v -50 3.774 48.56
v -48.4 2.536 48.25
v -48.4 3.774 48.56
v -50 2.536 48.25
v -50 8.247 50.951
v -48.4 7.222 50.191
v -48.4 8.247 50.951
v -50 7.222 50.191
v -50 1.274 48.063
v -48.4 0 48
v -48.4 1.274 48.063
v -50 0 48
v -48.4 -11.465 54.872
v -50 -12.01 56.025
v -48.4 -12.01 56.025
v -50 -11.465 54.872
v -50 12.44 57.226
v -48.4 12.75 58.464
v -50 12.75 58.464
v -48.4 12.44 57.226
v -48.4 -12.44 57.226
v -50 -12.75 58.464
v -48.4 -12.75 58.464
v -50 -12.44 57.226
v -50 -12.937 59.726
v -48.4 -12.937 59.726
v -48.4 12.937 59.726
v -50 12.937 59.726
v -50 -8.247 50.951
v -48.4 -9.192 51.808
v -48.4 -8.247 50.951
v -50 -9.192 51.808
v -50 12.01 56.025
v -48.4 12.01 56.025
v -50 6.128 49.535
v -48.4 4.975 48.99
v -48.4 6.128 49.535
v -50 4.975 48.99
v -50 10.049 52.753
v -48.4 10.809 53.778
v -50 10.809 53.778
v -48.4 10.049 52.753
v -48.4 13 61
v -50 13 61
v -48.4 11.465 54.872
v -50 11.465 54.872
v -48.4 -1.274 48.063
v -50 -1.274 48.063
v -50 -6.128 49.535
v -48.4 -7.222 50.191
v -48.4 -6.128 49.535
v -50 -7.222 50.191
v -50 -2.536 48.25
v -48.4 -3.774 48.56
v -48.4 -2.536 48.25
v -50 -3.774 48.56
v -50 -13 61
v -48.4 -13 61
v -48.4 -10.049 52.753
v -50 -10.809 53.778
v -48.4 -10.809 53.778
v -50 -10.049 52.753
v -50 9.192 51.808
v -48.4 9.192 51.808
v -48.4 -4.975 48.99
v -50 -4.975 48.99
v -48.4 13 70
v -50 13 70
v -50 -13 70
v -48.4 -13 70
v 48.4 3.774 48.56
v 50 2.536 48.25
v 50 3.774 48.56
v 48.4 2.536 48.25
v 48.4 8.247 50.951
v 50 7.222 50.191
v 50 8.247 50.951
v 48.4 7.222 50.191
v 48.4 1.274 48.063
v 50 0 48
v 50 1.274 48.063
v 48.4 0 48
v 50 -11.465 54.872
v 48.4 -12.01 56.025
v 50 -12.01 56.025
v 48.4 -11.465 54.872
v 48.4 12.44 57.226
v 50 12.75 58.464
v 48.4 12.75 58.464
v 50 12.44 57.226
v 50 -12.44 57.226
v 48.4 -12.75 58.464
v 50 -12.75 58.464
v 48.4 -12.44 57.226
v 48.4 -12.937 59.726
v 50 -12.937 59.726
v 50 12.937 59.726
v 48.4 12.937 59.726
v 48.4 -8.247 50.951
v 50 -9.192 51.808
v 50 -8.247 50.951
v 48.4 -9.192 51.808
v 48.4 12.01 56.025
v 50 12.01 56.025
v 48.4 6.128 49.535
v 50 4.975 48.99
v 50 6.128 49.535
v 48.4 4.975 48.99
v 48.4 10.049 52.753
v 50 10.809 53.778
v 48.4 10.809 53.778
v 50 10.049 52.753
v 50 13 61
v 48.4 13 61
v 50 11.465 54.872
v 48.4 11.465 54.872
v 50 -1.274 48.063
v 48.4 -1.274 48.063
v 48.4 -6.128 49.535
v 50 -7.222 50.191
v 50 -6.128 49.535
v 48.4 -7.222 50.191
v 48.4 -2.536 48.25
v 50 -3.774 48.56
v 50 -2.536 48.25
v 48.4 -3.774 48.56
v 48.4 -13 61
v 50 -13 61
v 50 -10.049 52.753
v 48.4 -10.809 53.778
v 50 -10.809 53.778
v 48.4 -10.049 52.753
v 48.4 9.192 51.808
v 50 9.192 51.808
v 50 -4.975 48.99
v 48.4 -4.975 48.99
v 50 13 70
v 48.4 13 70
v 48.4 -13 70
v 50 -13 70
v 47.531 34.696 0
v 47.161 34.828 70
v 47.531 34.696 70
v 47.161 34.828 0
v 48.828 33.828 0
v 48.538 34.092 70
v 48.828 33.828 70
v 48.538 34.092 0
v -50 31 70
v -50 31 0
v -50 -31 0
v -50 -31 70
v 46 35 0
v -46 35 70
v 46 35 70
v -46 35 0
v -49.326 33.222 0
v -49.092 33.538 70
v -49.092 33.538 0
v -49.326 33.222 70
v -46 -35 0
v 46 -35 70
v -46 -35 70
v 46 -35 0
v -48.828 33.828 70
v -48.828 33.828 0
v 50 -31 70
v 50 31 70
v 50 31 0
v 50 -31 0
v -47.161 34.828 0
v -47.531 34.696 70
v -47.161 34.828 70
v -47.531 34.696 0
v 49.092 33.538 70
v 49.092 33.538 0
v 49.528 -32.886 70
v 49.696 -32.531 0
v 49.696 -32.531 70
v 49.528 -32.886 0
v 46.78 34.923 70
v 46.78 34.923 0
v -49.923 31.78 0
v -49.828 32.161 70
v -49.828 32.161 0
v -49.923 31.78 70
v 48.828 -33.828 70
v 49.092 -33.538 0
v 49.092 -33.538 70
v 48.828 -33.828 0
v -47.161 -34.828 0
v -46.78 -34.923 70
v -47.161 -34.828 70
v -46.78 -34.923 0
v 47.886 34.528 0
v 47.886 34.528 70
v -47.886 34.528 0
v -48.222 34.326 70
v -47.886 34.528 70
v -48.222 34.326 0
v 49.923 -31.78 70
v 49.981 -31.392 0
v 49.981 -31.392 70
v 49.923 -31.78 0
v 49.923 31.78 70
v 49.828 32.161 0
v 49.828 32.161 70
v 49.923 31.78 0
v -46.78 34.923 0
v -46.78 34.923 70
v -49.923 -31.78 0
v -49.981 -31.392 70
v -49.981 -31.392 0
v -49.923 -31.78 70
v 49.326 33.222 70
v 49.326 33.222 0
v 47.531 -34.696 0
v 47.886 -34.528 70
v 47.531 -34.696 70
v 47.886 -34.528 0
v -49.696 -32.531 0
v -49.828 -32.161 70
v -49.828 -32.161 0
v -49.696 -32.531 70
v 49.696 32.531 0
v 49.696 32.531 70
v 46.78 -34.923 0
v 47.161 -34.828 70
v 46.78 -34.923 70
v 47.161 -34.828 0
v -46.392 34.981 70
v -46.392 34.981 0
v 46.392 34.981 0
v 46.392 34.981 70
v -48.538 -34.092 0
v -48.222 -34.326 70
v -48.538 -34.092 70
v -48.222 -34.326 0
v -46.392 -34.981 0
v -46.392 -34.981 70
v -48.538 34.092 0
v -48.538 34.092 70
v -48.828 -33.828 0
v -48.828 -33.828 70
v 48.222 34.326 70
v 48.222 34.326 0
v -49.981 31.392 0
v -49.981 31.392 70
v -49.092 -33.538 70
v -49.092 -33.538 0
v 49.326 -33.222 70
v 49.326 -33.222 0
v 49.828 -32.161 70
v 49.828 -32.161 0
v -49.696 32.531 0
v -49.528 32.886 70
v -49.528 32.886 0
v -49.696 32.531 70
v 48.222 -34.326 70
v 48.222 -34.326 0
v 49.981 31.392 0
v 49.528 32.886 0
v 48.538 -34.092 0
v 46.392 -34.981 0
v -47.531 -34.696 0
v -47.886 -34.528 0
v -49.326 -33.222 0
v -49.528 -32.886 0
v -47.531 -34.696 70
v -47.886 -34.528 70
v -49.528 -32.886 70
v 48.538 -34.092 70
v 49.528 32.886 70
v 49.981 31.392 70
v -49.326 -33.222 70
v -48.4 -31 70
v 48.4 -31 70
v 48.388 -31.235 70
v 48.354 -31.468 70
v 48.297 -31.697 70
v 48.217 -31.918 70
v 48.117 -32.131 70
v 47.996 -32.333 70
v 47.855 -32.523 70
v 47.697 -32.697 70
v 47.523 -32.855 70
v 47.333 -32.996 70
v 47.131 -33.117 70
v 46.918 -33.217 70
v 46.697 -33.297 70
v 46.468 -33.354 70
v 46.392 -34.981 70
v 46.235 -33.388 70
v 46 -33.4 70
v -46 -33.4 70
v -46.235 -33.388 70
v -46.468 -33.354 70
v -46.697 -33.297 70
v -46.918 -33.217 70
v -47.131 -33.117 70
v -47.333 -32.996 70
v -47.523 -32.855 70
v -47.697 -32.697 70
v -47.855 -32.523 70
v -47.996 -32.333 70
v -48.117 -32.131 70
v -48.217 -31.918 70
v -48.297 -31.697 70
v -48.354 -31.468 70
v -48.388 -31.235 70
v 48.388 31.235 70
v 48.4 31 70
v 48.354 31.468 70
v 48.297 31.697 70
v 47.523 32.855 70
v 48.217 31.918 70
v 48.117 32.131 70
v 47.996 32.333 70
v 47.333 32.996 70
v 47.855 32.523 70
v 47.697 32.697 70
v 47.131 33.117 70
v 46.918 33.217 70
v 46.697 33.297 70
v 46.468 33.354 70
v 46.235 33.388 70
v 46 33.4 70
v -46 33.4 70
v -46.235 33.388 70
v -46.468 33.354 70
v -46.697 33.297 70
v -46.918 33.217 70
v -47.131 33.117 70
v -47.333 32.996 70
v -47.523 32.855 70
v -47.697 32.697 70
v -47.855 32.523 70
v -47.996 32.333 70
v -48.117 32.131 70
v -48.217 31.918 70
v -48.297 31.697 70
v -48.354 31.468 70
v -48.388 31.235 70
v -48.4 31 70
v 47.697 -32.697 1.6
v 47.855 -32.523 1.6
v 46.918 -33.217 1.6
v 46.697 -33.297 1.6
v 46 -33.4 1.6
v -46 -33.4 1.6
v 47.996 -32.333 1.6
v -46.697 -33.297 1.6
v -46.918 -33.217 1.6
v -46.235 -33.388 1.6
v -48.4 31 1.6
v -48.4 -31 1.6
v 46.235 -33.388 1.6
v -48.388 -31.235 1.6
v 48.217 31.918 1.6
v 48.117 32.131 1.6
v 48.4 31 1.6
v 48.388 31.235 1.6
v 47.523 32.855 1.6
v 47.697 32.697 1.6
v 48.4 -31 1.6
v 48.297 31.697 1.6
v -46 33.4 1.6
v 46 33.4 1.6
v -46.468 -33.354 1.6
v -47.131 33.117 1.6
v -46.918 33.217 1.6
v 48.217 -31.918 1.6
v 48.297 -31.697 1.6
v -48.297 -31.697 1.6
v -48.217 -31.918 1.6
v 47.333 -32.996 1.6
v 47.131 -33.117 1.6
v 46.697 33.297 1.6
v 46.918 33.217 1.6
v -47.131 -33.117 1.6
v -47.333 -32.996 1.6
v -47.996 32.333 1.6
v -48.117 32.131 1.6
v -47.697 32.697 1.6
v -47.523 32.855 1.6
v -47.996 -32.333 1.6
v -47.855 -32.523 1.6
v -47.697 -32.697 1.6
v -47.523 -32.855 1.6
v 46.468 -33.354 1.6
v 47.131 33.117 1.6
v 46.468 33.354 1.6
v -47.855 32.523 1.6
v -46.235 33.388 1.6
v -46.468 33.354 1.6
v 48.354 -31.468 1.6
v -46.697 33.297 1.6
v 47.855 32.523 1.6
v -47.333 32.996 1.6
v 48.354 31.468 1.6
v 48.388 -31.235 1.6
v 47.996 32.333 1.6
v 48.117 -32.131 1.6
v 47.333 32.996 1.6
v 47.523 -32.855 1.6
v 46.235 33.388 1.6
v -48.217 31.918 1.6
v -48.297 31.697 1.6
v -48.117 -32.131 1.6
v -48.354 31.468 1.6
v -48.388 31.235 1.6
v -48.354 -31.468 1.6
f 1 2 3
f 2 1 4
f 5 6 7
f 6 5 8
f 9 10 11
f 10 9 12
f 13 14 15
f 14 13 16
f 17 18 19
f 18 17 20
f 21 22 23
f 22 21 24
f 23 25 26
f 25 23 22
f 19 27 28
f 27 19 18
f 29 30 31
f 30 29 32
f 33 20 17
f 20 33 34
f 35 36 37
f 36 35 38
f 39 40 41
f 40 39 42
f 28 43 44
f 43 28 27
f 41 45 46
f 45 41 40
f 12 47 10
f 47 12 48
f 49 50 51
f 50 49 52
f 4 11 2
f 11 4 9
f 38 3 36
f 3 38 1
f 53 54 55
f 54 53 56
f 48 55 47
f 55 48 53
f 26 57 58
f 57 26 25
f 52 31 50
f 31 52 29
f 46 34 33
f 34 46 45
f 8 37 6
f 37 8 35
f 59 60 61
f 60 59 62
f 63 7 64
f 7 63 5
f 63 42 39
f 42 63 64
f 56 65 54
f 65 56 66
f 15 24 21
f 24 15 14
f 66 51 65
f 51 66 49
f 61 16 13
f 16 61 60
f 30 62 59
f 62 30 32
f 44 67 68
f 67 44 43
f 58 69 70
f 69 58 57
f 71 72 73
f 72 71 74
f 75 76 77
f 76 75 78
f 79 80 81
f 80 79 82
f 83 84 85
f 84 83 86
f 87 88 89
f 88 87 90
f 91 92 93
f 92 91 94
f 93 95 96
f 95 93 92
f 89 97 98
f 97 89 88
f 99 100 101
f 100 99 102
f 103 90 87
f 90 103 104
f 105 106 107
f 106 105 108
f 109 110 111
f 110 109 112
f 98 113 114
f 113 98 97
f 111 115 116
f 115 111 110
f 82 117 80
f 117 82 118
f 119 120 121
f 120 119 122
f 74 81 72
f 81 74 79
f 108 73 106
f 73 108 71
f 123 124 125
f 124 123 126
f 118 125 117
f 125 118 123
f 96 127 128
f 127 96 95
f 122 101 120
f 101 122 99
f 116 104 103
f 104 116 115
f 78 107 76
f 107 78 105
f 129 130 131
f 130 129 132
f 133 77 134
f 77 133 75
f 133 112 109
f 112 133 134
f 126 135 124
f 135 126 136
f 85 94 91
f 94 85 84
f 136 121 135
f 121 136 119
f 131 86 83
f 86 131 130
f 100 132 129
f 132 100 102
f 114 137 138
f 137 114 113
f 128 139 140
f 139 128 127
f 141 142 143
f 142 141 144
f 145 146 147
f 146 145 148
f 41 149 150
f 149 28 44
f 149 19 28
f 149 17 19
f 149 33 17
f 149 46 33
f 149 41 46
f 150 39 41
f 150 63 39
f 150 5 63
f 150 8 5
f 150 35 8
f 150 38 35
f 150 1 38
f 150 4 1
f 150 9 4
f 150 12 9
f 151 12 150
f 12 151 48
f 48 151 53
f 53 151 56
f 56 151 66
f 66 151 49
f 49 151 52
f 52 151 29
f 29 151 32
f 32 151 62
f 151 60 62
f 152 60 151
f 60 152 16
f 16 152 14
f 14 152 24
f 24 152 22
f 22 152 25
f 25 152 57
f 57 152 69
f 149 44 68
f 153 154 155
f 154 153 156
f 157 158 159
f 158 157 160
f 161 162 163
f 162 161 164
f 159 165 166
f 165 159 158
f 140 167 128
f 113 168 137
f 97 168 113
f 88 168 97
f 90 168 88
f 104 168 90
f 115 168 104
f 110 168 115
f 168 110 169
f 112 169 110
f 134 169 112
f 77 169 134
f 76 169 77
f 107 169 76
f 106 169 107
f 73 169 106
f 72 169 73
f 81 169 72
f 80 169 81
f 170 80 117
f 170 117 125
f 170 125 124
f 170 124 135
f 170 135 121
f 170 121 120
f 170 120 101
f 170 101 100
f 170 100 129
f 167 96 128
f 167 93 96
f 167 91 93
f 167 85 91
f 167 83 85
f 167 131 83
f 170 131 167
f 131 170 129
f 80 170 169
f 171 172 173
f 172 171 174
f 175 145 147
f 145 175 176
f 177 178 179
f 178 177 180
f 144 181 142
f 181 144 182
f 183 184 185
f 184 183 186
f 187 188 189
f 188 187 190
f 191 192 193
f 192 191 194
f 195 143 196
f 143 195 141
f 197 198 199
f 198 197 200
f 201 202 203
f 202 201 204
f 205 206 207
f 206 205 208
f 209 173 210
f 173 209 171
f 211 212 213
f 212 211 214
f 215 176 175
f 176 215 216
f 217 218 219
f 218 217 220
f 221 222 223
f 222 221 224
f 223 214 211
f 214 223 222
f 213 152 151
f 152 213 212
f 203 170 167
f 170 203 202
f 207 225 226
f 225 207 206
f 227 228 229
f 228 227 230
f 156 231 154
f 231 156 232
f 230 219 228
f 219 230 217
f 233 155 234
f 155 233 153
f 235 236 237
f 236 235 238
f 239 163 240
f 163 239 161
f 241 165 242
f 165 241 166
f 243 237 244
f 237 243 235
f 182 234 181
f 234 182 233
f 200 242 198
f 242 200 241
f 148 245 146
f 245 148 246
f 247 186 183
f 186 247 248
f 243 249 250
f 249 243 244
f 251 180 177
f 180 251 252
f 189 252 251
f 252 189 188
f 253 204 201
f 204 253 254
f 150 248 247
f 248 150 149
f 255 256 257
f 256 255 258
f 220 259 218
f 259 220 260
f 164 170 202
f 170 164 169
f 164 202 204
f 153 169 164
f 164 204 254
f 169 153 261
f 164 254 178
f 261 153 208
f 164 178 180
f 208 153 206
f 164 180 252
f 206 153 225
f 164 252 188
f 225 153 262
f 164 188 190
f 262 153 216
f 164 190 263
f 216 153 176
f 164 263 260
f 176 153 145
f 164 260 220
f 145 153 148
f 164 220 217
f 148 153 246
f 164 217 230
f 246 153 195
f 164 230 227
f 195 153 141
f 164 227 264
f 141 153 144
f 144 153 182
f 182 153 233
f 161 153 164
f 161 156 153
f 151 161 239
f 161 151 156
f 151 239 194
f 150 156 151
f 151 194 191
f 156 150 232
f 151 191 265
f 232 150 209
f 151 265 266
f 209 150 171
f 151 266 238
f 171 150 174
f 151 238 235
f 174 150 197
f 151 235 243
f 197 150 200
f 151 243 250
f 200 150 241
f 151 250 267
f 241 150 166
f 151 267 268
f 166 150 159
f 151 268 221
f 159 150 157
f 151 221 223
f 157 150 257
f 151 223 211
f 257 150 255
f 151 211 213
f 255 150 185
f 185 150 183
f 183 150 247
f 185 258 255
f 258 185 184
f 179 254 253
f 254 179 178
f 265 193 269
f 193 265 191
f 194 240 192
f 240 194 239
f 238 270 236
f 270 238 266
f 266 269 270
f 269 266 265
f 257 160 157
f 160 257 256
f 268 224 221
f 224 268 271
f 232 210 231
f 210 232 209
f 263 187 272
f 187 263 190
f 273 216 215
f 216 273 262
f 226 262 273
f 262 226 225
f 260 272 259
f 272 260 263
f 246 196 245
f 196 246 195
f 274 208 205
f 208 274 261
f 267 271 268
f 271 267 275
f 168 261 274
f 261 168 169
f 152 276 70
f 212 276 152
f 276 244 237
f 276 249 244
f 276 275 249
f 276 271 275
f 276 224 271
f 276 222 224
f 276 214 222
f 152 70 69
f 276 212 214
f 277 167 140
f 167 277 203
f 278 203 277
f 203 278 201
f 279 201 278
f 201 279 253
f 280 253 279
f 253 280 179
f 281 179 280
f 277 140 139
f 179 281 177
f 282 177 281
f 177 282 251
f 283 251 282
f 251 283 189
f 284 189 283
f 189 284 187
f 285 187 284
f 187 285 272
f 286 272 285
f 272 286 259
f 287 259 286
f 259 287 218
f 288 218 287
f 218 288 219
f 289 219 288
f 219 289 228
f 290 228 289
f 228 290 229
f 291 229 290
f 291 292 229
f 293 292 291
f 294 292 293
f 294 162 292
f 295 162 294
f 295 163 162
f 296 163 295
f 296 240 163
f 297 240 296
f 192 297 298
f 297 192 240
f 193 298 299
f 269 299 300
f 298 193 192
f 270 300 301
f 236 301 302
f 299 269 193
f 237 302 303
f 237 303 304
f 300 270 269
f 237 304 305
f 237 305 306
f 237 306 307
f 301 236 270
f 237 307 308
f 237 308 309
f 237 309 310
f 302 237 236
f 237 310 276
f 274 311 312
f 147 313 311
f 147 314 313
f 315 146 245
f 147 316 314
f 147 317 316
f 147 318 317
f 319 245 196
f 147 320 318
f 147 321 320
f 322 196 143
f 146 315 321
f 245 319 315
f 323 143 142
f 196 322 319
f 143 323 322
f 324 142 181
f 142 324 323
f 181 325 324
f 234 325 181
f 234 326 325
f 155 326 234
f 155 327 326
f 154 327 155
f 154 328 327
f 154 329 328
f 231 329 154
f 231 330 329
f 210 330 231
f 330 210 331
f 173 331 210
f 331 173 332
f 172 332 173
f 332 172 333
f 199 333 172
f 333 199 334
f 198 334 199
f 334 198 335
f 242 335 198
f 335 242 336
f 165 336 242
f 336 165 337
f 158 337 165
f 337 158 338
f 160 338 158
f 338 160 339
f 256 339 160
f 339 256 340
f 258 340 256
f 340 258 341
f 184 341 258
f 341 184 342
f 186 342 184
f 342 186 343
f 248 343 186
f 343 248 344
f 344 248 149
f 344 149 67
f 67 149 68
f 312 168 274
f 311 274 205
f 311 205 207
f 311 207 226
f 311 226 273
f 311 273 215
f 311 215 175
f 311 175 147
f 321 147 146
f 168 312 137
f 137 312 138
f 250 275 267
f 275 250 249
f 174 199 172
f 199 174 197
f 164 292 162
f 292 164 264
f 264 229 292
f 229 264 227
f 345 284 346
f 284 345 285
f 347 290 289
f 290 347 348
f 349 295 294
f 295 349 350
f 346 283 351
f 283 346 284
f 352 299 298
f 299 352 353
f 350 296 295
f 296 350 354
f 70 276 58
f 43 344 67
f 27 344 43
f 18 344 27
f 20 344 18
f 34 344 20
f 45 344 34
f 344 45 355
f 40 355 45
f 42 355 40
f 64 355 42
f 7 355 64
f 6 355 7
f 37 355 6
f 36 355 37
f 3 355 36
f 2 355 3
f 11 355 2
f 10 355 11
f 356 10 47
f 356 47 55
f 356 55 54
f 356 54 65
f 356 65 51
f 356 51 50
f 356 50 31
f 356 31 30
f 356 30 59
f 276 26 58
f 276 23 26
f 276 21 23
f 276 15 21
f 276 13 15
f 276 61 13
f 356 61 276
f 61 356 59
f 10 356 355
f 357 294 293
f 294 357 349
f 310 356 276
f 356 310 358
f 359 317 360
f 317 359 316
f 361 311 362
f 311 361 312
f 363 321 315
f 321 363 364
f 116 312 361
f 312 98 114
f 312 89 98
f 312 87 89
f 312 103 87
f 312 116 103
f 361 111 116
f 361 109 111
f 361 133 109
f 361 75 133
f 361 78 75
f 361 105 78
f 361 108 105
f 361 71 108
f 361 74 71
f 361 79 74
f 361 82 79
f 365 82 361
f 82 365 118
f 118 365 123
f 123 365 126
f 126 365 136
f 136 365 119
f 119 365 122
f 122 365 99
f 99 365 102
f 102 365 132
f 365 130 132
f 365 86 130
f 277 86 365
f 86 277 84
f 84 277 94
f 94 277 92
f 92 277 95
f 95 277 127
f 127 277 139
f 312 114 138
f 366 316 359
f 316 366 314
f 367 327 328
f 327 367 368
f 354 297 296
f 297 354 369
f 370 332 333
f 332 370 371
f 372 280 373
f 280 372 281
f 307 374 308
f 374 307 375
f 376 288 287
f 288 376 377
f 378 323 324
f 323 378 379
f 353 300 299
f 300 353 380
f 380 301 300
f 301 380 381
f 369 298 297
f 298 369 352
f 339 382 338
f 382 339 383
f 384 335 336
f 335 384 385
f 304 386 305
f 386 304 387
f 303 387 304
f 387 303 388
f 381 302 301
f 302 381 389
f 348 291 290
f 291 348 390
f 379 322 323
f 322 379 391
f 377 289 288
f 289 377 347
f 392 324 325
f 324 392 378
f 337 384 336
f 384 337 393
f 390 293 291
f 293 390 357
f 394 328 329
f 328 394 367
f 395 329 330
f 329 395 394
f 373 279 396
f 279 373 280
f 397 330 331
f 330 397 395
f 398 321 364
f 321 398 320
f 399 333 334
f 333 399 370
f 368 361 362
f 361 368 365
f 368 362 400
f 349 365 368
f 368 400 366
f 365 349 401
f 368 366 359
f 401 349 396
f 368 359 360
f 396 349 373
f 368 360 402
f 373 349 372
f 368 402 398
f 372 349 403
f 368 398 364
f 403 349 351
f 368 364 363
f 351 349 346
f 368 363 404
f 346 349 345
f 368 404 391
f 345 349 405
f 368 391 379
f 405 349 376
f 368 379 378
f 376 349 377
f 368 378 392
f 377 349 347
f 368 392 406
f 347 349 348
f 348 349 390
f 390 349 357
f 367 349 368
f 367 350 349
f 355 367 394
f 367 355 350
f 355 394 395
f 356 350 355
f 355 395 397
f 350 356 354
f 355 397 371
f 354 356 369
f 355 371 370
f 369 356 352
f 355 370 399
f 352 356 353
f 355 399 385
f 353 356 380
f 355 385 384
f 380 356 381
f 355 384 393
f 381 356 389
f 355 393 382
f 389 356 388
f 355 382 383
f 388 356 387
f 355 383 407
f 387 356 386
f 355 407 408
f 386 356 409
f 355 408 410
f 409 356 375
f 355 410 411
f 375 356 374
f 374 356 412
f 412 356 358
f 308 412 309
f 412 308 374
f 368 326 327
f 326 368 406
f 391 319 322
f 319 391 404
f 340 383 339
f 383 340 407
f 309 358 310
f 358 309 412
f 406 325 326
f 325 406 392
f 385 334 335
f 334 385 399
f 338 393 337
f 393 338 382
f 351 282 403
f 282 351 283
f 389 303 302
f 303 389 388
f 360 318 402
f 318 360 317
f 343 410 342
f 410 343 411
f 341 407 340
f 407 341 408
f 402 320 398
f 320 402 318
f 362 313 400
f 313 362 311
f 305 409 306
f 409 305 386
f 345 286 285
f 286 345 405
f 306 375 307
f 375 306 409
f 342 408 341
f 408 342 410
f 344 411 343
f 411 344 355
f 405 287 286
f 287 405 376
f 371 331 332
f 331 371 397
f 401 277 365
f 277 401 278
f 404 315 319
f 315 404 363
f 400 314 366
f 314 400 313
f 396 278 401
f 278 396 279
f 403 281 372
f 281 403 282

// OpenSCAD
// file: _resistor_storage_box.scad
// =====================================
// Resistor storage box
// Open-top box that files resistor-kit bags on edge like index cards,
// plus a push-on lid. Sized to the issue's 10 x 7 x 7 cm outer envelope.
// =====================================
// Parts:
//   resistor_box     -> resistor_box.stl      (open-top box with end-wall thumb scoops)
//   resistor_box_lid -> resistor_box_lid.stl  (flat lid with an inner locating lip)
//
// Orientation: Z-up, centred on X/Y, base at z=0. The box prints floor-down
// as exported. The lid is modelled top-face-down (plate on the bed, lip
// rising from it) so it also prints flat without supports.
//
// Bag assumption: 1/4 W kit bags (~100 mm x 65 mm, ~2.5-3 mm thick with 20
// taped resistors) stand on their 100 mm edge along X and file across Y,
// so a 25-value kit fills the ~67 mm cavity width. The two end walls carry a
// U-shaped thumb scoop so a single bag's end can be pinched and lifted out,
// and so a thumb can push the fitted lid up from below.

$fn = 64;

// ---- Outer envelope (mm) ----
outer_l = 100;   // X: the bags' long edge lies along this
outer_w = 70;    // Y: bags file across this
outer_h = 70;    // Z: open-top box height, lid adds lid_t on top

// ---- Walls ----
wall     = 1.6;  // side wall thickness (4 perimeters at 0.4 mm)
floor_t  = 1.6;  // floor thickness
corner_r = 4;    // outer vertical corner radius

// ---- Thumb scoops in the two end (Y-Z) walls ----
scoops      = true;
scoop_w     = 26;  // scoop width across the end wall
scoop_depth = 22;  // scoop depth below the rim (>= scoop_w/2 for the round bottom)

// ---- Lid ----
lid_t         = 2;    // lid plate thickness
lip_h         = 5;    // how far the locating lip drops into the cavity
lip_t         = 1.6;  // lip wall thickness
lid_clearance = 0.3;  // per-side gap between the lip and the cavity wall

// ---- Derived ----
inner_l  = outer_l - 2 * wall;
inner_w  = outer_w - 2 * wall;
inner_r  = max(corner_r - wall, 0.5);
cavity_h = outer_h - floor_t;
lip_l    = inner_l - 2 * lid_clearance;
lip_w    = inner_w - 2 * lid_clearance;
lip_r    = max(inner_r - lid_clearance, 0.5);
// Clamp rather than assert on the raw customizer values: scoop_w and
// scoop_depth are bounded by outer_w/corner_r and cavity_h respectively, and
// those bounds shift independently of scoop_w/scoop_depth's own manifest
// ranges, so a hard assert can reject combinations that are each in-range.
eff_scoop_w     = min(scoop_w, outer_w - 2 * corner_r - 2);
eff_scoop_depth = min(scoop_depth, cavity_h - 10);
scoop_z0 = outer_h - eff_scoop_depth + eff_scoop_w / 2;  // centre of the scoop's round bottom

assert(!scoops || eff_scoop_depth >= eff_scoop_w / 2,
       "scoop_depth must be at least scoop_w/2 for the rounded bottom");
assert(lip_l > 2 * lip_t + 10 && lip_w > 2 * lip_t + 10,
       "box too small for the lid lip");

// Rounded-rectangle vertical prism: hull of four corner cylinders.
// l along X, w along Y, centred on X/Y, base at z=0.
module rbox(l, w, h, r) {
    hull()
        for (sx = [-1, 1], sy = [-1, 1])
            translate([sx * (l / 2 - r), sy * (w / 2 - r), 0])
                cylinder(r = r, h = h);
}

// U-shaped cutter for one end wall: a horizontal cylinder along X for the
// round bottom plus a block up past the rim. Centred on X/Y; the caller
// translates it onto the wall. Cuts wall + 2 mm along X.
module scoop_cutter() {
    translate([0, 0, scoop_z0])
        rotate([0, 90, 0])
            cylinder(d = eff_scoop_w, h = wall + 2, center = true);
    translate([-(wall + 2) / 2, -eff_scoop_w / 2, scoop_z0])
        cube([wall + 2, eff_scoop_w, outer_h - scoop_z0 + 1]);
}

// Open-top box, floor on the bed.
module resistor_box() {
    difference() {
        rbox(outer_l, outer_w, outer_h, corner_r);
        translate([0, 0, floor_t])
            rbox(inner_l, inner_w, cavity_h + 1, inner_r);
        if (scoops)
            for (sx = [-1, 1])
                translate([sx * (outer_l / 2 - wall / 2), 0, 0])
                    scoop_cutter();
    }
}

// Lid, modelled top-face-down: the plate sits on the bed and the lip
// rises from it; flip it over to fit the box.
module resistor_box_lid() {
    rbox(outer_l, outer_w, lid_t, corner_r);
    translate([0, 0, lid_t - 0.01])
        difference() {
            rbox(lip_l, lip_w, lip_h + 0.01, lip_r);
            translate([0, 0, -1])
                rbox(lip_l - 2 * lip_t, lip_w - 2 * lip_t, lip_h + 3,
                     max(lip_r - lip_t, 0.5));
        }
}
// main file
// Resistor storage box - open-top box with end-wall thumb scoops
// Render this file to generate resistor_box.stl

include <_resistor_storage_box.scad>

resistor_box();
